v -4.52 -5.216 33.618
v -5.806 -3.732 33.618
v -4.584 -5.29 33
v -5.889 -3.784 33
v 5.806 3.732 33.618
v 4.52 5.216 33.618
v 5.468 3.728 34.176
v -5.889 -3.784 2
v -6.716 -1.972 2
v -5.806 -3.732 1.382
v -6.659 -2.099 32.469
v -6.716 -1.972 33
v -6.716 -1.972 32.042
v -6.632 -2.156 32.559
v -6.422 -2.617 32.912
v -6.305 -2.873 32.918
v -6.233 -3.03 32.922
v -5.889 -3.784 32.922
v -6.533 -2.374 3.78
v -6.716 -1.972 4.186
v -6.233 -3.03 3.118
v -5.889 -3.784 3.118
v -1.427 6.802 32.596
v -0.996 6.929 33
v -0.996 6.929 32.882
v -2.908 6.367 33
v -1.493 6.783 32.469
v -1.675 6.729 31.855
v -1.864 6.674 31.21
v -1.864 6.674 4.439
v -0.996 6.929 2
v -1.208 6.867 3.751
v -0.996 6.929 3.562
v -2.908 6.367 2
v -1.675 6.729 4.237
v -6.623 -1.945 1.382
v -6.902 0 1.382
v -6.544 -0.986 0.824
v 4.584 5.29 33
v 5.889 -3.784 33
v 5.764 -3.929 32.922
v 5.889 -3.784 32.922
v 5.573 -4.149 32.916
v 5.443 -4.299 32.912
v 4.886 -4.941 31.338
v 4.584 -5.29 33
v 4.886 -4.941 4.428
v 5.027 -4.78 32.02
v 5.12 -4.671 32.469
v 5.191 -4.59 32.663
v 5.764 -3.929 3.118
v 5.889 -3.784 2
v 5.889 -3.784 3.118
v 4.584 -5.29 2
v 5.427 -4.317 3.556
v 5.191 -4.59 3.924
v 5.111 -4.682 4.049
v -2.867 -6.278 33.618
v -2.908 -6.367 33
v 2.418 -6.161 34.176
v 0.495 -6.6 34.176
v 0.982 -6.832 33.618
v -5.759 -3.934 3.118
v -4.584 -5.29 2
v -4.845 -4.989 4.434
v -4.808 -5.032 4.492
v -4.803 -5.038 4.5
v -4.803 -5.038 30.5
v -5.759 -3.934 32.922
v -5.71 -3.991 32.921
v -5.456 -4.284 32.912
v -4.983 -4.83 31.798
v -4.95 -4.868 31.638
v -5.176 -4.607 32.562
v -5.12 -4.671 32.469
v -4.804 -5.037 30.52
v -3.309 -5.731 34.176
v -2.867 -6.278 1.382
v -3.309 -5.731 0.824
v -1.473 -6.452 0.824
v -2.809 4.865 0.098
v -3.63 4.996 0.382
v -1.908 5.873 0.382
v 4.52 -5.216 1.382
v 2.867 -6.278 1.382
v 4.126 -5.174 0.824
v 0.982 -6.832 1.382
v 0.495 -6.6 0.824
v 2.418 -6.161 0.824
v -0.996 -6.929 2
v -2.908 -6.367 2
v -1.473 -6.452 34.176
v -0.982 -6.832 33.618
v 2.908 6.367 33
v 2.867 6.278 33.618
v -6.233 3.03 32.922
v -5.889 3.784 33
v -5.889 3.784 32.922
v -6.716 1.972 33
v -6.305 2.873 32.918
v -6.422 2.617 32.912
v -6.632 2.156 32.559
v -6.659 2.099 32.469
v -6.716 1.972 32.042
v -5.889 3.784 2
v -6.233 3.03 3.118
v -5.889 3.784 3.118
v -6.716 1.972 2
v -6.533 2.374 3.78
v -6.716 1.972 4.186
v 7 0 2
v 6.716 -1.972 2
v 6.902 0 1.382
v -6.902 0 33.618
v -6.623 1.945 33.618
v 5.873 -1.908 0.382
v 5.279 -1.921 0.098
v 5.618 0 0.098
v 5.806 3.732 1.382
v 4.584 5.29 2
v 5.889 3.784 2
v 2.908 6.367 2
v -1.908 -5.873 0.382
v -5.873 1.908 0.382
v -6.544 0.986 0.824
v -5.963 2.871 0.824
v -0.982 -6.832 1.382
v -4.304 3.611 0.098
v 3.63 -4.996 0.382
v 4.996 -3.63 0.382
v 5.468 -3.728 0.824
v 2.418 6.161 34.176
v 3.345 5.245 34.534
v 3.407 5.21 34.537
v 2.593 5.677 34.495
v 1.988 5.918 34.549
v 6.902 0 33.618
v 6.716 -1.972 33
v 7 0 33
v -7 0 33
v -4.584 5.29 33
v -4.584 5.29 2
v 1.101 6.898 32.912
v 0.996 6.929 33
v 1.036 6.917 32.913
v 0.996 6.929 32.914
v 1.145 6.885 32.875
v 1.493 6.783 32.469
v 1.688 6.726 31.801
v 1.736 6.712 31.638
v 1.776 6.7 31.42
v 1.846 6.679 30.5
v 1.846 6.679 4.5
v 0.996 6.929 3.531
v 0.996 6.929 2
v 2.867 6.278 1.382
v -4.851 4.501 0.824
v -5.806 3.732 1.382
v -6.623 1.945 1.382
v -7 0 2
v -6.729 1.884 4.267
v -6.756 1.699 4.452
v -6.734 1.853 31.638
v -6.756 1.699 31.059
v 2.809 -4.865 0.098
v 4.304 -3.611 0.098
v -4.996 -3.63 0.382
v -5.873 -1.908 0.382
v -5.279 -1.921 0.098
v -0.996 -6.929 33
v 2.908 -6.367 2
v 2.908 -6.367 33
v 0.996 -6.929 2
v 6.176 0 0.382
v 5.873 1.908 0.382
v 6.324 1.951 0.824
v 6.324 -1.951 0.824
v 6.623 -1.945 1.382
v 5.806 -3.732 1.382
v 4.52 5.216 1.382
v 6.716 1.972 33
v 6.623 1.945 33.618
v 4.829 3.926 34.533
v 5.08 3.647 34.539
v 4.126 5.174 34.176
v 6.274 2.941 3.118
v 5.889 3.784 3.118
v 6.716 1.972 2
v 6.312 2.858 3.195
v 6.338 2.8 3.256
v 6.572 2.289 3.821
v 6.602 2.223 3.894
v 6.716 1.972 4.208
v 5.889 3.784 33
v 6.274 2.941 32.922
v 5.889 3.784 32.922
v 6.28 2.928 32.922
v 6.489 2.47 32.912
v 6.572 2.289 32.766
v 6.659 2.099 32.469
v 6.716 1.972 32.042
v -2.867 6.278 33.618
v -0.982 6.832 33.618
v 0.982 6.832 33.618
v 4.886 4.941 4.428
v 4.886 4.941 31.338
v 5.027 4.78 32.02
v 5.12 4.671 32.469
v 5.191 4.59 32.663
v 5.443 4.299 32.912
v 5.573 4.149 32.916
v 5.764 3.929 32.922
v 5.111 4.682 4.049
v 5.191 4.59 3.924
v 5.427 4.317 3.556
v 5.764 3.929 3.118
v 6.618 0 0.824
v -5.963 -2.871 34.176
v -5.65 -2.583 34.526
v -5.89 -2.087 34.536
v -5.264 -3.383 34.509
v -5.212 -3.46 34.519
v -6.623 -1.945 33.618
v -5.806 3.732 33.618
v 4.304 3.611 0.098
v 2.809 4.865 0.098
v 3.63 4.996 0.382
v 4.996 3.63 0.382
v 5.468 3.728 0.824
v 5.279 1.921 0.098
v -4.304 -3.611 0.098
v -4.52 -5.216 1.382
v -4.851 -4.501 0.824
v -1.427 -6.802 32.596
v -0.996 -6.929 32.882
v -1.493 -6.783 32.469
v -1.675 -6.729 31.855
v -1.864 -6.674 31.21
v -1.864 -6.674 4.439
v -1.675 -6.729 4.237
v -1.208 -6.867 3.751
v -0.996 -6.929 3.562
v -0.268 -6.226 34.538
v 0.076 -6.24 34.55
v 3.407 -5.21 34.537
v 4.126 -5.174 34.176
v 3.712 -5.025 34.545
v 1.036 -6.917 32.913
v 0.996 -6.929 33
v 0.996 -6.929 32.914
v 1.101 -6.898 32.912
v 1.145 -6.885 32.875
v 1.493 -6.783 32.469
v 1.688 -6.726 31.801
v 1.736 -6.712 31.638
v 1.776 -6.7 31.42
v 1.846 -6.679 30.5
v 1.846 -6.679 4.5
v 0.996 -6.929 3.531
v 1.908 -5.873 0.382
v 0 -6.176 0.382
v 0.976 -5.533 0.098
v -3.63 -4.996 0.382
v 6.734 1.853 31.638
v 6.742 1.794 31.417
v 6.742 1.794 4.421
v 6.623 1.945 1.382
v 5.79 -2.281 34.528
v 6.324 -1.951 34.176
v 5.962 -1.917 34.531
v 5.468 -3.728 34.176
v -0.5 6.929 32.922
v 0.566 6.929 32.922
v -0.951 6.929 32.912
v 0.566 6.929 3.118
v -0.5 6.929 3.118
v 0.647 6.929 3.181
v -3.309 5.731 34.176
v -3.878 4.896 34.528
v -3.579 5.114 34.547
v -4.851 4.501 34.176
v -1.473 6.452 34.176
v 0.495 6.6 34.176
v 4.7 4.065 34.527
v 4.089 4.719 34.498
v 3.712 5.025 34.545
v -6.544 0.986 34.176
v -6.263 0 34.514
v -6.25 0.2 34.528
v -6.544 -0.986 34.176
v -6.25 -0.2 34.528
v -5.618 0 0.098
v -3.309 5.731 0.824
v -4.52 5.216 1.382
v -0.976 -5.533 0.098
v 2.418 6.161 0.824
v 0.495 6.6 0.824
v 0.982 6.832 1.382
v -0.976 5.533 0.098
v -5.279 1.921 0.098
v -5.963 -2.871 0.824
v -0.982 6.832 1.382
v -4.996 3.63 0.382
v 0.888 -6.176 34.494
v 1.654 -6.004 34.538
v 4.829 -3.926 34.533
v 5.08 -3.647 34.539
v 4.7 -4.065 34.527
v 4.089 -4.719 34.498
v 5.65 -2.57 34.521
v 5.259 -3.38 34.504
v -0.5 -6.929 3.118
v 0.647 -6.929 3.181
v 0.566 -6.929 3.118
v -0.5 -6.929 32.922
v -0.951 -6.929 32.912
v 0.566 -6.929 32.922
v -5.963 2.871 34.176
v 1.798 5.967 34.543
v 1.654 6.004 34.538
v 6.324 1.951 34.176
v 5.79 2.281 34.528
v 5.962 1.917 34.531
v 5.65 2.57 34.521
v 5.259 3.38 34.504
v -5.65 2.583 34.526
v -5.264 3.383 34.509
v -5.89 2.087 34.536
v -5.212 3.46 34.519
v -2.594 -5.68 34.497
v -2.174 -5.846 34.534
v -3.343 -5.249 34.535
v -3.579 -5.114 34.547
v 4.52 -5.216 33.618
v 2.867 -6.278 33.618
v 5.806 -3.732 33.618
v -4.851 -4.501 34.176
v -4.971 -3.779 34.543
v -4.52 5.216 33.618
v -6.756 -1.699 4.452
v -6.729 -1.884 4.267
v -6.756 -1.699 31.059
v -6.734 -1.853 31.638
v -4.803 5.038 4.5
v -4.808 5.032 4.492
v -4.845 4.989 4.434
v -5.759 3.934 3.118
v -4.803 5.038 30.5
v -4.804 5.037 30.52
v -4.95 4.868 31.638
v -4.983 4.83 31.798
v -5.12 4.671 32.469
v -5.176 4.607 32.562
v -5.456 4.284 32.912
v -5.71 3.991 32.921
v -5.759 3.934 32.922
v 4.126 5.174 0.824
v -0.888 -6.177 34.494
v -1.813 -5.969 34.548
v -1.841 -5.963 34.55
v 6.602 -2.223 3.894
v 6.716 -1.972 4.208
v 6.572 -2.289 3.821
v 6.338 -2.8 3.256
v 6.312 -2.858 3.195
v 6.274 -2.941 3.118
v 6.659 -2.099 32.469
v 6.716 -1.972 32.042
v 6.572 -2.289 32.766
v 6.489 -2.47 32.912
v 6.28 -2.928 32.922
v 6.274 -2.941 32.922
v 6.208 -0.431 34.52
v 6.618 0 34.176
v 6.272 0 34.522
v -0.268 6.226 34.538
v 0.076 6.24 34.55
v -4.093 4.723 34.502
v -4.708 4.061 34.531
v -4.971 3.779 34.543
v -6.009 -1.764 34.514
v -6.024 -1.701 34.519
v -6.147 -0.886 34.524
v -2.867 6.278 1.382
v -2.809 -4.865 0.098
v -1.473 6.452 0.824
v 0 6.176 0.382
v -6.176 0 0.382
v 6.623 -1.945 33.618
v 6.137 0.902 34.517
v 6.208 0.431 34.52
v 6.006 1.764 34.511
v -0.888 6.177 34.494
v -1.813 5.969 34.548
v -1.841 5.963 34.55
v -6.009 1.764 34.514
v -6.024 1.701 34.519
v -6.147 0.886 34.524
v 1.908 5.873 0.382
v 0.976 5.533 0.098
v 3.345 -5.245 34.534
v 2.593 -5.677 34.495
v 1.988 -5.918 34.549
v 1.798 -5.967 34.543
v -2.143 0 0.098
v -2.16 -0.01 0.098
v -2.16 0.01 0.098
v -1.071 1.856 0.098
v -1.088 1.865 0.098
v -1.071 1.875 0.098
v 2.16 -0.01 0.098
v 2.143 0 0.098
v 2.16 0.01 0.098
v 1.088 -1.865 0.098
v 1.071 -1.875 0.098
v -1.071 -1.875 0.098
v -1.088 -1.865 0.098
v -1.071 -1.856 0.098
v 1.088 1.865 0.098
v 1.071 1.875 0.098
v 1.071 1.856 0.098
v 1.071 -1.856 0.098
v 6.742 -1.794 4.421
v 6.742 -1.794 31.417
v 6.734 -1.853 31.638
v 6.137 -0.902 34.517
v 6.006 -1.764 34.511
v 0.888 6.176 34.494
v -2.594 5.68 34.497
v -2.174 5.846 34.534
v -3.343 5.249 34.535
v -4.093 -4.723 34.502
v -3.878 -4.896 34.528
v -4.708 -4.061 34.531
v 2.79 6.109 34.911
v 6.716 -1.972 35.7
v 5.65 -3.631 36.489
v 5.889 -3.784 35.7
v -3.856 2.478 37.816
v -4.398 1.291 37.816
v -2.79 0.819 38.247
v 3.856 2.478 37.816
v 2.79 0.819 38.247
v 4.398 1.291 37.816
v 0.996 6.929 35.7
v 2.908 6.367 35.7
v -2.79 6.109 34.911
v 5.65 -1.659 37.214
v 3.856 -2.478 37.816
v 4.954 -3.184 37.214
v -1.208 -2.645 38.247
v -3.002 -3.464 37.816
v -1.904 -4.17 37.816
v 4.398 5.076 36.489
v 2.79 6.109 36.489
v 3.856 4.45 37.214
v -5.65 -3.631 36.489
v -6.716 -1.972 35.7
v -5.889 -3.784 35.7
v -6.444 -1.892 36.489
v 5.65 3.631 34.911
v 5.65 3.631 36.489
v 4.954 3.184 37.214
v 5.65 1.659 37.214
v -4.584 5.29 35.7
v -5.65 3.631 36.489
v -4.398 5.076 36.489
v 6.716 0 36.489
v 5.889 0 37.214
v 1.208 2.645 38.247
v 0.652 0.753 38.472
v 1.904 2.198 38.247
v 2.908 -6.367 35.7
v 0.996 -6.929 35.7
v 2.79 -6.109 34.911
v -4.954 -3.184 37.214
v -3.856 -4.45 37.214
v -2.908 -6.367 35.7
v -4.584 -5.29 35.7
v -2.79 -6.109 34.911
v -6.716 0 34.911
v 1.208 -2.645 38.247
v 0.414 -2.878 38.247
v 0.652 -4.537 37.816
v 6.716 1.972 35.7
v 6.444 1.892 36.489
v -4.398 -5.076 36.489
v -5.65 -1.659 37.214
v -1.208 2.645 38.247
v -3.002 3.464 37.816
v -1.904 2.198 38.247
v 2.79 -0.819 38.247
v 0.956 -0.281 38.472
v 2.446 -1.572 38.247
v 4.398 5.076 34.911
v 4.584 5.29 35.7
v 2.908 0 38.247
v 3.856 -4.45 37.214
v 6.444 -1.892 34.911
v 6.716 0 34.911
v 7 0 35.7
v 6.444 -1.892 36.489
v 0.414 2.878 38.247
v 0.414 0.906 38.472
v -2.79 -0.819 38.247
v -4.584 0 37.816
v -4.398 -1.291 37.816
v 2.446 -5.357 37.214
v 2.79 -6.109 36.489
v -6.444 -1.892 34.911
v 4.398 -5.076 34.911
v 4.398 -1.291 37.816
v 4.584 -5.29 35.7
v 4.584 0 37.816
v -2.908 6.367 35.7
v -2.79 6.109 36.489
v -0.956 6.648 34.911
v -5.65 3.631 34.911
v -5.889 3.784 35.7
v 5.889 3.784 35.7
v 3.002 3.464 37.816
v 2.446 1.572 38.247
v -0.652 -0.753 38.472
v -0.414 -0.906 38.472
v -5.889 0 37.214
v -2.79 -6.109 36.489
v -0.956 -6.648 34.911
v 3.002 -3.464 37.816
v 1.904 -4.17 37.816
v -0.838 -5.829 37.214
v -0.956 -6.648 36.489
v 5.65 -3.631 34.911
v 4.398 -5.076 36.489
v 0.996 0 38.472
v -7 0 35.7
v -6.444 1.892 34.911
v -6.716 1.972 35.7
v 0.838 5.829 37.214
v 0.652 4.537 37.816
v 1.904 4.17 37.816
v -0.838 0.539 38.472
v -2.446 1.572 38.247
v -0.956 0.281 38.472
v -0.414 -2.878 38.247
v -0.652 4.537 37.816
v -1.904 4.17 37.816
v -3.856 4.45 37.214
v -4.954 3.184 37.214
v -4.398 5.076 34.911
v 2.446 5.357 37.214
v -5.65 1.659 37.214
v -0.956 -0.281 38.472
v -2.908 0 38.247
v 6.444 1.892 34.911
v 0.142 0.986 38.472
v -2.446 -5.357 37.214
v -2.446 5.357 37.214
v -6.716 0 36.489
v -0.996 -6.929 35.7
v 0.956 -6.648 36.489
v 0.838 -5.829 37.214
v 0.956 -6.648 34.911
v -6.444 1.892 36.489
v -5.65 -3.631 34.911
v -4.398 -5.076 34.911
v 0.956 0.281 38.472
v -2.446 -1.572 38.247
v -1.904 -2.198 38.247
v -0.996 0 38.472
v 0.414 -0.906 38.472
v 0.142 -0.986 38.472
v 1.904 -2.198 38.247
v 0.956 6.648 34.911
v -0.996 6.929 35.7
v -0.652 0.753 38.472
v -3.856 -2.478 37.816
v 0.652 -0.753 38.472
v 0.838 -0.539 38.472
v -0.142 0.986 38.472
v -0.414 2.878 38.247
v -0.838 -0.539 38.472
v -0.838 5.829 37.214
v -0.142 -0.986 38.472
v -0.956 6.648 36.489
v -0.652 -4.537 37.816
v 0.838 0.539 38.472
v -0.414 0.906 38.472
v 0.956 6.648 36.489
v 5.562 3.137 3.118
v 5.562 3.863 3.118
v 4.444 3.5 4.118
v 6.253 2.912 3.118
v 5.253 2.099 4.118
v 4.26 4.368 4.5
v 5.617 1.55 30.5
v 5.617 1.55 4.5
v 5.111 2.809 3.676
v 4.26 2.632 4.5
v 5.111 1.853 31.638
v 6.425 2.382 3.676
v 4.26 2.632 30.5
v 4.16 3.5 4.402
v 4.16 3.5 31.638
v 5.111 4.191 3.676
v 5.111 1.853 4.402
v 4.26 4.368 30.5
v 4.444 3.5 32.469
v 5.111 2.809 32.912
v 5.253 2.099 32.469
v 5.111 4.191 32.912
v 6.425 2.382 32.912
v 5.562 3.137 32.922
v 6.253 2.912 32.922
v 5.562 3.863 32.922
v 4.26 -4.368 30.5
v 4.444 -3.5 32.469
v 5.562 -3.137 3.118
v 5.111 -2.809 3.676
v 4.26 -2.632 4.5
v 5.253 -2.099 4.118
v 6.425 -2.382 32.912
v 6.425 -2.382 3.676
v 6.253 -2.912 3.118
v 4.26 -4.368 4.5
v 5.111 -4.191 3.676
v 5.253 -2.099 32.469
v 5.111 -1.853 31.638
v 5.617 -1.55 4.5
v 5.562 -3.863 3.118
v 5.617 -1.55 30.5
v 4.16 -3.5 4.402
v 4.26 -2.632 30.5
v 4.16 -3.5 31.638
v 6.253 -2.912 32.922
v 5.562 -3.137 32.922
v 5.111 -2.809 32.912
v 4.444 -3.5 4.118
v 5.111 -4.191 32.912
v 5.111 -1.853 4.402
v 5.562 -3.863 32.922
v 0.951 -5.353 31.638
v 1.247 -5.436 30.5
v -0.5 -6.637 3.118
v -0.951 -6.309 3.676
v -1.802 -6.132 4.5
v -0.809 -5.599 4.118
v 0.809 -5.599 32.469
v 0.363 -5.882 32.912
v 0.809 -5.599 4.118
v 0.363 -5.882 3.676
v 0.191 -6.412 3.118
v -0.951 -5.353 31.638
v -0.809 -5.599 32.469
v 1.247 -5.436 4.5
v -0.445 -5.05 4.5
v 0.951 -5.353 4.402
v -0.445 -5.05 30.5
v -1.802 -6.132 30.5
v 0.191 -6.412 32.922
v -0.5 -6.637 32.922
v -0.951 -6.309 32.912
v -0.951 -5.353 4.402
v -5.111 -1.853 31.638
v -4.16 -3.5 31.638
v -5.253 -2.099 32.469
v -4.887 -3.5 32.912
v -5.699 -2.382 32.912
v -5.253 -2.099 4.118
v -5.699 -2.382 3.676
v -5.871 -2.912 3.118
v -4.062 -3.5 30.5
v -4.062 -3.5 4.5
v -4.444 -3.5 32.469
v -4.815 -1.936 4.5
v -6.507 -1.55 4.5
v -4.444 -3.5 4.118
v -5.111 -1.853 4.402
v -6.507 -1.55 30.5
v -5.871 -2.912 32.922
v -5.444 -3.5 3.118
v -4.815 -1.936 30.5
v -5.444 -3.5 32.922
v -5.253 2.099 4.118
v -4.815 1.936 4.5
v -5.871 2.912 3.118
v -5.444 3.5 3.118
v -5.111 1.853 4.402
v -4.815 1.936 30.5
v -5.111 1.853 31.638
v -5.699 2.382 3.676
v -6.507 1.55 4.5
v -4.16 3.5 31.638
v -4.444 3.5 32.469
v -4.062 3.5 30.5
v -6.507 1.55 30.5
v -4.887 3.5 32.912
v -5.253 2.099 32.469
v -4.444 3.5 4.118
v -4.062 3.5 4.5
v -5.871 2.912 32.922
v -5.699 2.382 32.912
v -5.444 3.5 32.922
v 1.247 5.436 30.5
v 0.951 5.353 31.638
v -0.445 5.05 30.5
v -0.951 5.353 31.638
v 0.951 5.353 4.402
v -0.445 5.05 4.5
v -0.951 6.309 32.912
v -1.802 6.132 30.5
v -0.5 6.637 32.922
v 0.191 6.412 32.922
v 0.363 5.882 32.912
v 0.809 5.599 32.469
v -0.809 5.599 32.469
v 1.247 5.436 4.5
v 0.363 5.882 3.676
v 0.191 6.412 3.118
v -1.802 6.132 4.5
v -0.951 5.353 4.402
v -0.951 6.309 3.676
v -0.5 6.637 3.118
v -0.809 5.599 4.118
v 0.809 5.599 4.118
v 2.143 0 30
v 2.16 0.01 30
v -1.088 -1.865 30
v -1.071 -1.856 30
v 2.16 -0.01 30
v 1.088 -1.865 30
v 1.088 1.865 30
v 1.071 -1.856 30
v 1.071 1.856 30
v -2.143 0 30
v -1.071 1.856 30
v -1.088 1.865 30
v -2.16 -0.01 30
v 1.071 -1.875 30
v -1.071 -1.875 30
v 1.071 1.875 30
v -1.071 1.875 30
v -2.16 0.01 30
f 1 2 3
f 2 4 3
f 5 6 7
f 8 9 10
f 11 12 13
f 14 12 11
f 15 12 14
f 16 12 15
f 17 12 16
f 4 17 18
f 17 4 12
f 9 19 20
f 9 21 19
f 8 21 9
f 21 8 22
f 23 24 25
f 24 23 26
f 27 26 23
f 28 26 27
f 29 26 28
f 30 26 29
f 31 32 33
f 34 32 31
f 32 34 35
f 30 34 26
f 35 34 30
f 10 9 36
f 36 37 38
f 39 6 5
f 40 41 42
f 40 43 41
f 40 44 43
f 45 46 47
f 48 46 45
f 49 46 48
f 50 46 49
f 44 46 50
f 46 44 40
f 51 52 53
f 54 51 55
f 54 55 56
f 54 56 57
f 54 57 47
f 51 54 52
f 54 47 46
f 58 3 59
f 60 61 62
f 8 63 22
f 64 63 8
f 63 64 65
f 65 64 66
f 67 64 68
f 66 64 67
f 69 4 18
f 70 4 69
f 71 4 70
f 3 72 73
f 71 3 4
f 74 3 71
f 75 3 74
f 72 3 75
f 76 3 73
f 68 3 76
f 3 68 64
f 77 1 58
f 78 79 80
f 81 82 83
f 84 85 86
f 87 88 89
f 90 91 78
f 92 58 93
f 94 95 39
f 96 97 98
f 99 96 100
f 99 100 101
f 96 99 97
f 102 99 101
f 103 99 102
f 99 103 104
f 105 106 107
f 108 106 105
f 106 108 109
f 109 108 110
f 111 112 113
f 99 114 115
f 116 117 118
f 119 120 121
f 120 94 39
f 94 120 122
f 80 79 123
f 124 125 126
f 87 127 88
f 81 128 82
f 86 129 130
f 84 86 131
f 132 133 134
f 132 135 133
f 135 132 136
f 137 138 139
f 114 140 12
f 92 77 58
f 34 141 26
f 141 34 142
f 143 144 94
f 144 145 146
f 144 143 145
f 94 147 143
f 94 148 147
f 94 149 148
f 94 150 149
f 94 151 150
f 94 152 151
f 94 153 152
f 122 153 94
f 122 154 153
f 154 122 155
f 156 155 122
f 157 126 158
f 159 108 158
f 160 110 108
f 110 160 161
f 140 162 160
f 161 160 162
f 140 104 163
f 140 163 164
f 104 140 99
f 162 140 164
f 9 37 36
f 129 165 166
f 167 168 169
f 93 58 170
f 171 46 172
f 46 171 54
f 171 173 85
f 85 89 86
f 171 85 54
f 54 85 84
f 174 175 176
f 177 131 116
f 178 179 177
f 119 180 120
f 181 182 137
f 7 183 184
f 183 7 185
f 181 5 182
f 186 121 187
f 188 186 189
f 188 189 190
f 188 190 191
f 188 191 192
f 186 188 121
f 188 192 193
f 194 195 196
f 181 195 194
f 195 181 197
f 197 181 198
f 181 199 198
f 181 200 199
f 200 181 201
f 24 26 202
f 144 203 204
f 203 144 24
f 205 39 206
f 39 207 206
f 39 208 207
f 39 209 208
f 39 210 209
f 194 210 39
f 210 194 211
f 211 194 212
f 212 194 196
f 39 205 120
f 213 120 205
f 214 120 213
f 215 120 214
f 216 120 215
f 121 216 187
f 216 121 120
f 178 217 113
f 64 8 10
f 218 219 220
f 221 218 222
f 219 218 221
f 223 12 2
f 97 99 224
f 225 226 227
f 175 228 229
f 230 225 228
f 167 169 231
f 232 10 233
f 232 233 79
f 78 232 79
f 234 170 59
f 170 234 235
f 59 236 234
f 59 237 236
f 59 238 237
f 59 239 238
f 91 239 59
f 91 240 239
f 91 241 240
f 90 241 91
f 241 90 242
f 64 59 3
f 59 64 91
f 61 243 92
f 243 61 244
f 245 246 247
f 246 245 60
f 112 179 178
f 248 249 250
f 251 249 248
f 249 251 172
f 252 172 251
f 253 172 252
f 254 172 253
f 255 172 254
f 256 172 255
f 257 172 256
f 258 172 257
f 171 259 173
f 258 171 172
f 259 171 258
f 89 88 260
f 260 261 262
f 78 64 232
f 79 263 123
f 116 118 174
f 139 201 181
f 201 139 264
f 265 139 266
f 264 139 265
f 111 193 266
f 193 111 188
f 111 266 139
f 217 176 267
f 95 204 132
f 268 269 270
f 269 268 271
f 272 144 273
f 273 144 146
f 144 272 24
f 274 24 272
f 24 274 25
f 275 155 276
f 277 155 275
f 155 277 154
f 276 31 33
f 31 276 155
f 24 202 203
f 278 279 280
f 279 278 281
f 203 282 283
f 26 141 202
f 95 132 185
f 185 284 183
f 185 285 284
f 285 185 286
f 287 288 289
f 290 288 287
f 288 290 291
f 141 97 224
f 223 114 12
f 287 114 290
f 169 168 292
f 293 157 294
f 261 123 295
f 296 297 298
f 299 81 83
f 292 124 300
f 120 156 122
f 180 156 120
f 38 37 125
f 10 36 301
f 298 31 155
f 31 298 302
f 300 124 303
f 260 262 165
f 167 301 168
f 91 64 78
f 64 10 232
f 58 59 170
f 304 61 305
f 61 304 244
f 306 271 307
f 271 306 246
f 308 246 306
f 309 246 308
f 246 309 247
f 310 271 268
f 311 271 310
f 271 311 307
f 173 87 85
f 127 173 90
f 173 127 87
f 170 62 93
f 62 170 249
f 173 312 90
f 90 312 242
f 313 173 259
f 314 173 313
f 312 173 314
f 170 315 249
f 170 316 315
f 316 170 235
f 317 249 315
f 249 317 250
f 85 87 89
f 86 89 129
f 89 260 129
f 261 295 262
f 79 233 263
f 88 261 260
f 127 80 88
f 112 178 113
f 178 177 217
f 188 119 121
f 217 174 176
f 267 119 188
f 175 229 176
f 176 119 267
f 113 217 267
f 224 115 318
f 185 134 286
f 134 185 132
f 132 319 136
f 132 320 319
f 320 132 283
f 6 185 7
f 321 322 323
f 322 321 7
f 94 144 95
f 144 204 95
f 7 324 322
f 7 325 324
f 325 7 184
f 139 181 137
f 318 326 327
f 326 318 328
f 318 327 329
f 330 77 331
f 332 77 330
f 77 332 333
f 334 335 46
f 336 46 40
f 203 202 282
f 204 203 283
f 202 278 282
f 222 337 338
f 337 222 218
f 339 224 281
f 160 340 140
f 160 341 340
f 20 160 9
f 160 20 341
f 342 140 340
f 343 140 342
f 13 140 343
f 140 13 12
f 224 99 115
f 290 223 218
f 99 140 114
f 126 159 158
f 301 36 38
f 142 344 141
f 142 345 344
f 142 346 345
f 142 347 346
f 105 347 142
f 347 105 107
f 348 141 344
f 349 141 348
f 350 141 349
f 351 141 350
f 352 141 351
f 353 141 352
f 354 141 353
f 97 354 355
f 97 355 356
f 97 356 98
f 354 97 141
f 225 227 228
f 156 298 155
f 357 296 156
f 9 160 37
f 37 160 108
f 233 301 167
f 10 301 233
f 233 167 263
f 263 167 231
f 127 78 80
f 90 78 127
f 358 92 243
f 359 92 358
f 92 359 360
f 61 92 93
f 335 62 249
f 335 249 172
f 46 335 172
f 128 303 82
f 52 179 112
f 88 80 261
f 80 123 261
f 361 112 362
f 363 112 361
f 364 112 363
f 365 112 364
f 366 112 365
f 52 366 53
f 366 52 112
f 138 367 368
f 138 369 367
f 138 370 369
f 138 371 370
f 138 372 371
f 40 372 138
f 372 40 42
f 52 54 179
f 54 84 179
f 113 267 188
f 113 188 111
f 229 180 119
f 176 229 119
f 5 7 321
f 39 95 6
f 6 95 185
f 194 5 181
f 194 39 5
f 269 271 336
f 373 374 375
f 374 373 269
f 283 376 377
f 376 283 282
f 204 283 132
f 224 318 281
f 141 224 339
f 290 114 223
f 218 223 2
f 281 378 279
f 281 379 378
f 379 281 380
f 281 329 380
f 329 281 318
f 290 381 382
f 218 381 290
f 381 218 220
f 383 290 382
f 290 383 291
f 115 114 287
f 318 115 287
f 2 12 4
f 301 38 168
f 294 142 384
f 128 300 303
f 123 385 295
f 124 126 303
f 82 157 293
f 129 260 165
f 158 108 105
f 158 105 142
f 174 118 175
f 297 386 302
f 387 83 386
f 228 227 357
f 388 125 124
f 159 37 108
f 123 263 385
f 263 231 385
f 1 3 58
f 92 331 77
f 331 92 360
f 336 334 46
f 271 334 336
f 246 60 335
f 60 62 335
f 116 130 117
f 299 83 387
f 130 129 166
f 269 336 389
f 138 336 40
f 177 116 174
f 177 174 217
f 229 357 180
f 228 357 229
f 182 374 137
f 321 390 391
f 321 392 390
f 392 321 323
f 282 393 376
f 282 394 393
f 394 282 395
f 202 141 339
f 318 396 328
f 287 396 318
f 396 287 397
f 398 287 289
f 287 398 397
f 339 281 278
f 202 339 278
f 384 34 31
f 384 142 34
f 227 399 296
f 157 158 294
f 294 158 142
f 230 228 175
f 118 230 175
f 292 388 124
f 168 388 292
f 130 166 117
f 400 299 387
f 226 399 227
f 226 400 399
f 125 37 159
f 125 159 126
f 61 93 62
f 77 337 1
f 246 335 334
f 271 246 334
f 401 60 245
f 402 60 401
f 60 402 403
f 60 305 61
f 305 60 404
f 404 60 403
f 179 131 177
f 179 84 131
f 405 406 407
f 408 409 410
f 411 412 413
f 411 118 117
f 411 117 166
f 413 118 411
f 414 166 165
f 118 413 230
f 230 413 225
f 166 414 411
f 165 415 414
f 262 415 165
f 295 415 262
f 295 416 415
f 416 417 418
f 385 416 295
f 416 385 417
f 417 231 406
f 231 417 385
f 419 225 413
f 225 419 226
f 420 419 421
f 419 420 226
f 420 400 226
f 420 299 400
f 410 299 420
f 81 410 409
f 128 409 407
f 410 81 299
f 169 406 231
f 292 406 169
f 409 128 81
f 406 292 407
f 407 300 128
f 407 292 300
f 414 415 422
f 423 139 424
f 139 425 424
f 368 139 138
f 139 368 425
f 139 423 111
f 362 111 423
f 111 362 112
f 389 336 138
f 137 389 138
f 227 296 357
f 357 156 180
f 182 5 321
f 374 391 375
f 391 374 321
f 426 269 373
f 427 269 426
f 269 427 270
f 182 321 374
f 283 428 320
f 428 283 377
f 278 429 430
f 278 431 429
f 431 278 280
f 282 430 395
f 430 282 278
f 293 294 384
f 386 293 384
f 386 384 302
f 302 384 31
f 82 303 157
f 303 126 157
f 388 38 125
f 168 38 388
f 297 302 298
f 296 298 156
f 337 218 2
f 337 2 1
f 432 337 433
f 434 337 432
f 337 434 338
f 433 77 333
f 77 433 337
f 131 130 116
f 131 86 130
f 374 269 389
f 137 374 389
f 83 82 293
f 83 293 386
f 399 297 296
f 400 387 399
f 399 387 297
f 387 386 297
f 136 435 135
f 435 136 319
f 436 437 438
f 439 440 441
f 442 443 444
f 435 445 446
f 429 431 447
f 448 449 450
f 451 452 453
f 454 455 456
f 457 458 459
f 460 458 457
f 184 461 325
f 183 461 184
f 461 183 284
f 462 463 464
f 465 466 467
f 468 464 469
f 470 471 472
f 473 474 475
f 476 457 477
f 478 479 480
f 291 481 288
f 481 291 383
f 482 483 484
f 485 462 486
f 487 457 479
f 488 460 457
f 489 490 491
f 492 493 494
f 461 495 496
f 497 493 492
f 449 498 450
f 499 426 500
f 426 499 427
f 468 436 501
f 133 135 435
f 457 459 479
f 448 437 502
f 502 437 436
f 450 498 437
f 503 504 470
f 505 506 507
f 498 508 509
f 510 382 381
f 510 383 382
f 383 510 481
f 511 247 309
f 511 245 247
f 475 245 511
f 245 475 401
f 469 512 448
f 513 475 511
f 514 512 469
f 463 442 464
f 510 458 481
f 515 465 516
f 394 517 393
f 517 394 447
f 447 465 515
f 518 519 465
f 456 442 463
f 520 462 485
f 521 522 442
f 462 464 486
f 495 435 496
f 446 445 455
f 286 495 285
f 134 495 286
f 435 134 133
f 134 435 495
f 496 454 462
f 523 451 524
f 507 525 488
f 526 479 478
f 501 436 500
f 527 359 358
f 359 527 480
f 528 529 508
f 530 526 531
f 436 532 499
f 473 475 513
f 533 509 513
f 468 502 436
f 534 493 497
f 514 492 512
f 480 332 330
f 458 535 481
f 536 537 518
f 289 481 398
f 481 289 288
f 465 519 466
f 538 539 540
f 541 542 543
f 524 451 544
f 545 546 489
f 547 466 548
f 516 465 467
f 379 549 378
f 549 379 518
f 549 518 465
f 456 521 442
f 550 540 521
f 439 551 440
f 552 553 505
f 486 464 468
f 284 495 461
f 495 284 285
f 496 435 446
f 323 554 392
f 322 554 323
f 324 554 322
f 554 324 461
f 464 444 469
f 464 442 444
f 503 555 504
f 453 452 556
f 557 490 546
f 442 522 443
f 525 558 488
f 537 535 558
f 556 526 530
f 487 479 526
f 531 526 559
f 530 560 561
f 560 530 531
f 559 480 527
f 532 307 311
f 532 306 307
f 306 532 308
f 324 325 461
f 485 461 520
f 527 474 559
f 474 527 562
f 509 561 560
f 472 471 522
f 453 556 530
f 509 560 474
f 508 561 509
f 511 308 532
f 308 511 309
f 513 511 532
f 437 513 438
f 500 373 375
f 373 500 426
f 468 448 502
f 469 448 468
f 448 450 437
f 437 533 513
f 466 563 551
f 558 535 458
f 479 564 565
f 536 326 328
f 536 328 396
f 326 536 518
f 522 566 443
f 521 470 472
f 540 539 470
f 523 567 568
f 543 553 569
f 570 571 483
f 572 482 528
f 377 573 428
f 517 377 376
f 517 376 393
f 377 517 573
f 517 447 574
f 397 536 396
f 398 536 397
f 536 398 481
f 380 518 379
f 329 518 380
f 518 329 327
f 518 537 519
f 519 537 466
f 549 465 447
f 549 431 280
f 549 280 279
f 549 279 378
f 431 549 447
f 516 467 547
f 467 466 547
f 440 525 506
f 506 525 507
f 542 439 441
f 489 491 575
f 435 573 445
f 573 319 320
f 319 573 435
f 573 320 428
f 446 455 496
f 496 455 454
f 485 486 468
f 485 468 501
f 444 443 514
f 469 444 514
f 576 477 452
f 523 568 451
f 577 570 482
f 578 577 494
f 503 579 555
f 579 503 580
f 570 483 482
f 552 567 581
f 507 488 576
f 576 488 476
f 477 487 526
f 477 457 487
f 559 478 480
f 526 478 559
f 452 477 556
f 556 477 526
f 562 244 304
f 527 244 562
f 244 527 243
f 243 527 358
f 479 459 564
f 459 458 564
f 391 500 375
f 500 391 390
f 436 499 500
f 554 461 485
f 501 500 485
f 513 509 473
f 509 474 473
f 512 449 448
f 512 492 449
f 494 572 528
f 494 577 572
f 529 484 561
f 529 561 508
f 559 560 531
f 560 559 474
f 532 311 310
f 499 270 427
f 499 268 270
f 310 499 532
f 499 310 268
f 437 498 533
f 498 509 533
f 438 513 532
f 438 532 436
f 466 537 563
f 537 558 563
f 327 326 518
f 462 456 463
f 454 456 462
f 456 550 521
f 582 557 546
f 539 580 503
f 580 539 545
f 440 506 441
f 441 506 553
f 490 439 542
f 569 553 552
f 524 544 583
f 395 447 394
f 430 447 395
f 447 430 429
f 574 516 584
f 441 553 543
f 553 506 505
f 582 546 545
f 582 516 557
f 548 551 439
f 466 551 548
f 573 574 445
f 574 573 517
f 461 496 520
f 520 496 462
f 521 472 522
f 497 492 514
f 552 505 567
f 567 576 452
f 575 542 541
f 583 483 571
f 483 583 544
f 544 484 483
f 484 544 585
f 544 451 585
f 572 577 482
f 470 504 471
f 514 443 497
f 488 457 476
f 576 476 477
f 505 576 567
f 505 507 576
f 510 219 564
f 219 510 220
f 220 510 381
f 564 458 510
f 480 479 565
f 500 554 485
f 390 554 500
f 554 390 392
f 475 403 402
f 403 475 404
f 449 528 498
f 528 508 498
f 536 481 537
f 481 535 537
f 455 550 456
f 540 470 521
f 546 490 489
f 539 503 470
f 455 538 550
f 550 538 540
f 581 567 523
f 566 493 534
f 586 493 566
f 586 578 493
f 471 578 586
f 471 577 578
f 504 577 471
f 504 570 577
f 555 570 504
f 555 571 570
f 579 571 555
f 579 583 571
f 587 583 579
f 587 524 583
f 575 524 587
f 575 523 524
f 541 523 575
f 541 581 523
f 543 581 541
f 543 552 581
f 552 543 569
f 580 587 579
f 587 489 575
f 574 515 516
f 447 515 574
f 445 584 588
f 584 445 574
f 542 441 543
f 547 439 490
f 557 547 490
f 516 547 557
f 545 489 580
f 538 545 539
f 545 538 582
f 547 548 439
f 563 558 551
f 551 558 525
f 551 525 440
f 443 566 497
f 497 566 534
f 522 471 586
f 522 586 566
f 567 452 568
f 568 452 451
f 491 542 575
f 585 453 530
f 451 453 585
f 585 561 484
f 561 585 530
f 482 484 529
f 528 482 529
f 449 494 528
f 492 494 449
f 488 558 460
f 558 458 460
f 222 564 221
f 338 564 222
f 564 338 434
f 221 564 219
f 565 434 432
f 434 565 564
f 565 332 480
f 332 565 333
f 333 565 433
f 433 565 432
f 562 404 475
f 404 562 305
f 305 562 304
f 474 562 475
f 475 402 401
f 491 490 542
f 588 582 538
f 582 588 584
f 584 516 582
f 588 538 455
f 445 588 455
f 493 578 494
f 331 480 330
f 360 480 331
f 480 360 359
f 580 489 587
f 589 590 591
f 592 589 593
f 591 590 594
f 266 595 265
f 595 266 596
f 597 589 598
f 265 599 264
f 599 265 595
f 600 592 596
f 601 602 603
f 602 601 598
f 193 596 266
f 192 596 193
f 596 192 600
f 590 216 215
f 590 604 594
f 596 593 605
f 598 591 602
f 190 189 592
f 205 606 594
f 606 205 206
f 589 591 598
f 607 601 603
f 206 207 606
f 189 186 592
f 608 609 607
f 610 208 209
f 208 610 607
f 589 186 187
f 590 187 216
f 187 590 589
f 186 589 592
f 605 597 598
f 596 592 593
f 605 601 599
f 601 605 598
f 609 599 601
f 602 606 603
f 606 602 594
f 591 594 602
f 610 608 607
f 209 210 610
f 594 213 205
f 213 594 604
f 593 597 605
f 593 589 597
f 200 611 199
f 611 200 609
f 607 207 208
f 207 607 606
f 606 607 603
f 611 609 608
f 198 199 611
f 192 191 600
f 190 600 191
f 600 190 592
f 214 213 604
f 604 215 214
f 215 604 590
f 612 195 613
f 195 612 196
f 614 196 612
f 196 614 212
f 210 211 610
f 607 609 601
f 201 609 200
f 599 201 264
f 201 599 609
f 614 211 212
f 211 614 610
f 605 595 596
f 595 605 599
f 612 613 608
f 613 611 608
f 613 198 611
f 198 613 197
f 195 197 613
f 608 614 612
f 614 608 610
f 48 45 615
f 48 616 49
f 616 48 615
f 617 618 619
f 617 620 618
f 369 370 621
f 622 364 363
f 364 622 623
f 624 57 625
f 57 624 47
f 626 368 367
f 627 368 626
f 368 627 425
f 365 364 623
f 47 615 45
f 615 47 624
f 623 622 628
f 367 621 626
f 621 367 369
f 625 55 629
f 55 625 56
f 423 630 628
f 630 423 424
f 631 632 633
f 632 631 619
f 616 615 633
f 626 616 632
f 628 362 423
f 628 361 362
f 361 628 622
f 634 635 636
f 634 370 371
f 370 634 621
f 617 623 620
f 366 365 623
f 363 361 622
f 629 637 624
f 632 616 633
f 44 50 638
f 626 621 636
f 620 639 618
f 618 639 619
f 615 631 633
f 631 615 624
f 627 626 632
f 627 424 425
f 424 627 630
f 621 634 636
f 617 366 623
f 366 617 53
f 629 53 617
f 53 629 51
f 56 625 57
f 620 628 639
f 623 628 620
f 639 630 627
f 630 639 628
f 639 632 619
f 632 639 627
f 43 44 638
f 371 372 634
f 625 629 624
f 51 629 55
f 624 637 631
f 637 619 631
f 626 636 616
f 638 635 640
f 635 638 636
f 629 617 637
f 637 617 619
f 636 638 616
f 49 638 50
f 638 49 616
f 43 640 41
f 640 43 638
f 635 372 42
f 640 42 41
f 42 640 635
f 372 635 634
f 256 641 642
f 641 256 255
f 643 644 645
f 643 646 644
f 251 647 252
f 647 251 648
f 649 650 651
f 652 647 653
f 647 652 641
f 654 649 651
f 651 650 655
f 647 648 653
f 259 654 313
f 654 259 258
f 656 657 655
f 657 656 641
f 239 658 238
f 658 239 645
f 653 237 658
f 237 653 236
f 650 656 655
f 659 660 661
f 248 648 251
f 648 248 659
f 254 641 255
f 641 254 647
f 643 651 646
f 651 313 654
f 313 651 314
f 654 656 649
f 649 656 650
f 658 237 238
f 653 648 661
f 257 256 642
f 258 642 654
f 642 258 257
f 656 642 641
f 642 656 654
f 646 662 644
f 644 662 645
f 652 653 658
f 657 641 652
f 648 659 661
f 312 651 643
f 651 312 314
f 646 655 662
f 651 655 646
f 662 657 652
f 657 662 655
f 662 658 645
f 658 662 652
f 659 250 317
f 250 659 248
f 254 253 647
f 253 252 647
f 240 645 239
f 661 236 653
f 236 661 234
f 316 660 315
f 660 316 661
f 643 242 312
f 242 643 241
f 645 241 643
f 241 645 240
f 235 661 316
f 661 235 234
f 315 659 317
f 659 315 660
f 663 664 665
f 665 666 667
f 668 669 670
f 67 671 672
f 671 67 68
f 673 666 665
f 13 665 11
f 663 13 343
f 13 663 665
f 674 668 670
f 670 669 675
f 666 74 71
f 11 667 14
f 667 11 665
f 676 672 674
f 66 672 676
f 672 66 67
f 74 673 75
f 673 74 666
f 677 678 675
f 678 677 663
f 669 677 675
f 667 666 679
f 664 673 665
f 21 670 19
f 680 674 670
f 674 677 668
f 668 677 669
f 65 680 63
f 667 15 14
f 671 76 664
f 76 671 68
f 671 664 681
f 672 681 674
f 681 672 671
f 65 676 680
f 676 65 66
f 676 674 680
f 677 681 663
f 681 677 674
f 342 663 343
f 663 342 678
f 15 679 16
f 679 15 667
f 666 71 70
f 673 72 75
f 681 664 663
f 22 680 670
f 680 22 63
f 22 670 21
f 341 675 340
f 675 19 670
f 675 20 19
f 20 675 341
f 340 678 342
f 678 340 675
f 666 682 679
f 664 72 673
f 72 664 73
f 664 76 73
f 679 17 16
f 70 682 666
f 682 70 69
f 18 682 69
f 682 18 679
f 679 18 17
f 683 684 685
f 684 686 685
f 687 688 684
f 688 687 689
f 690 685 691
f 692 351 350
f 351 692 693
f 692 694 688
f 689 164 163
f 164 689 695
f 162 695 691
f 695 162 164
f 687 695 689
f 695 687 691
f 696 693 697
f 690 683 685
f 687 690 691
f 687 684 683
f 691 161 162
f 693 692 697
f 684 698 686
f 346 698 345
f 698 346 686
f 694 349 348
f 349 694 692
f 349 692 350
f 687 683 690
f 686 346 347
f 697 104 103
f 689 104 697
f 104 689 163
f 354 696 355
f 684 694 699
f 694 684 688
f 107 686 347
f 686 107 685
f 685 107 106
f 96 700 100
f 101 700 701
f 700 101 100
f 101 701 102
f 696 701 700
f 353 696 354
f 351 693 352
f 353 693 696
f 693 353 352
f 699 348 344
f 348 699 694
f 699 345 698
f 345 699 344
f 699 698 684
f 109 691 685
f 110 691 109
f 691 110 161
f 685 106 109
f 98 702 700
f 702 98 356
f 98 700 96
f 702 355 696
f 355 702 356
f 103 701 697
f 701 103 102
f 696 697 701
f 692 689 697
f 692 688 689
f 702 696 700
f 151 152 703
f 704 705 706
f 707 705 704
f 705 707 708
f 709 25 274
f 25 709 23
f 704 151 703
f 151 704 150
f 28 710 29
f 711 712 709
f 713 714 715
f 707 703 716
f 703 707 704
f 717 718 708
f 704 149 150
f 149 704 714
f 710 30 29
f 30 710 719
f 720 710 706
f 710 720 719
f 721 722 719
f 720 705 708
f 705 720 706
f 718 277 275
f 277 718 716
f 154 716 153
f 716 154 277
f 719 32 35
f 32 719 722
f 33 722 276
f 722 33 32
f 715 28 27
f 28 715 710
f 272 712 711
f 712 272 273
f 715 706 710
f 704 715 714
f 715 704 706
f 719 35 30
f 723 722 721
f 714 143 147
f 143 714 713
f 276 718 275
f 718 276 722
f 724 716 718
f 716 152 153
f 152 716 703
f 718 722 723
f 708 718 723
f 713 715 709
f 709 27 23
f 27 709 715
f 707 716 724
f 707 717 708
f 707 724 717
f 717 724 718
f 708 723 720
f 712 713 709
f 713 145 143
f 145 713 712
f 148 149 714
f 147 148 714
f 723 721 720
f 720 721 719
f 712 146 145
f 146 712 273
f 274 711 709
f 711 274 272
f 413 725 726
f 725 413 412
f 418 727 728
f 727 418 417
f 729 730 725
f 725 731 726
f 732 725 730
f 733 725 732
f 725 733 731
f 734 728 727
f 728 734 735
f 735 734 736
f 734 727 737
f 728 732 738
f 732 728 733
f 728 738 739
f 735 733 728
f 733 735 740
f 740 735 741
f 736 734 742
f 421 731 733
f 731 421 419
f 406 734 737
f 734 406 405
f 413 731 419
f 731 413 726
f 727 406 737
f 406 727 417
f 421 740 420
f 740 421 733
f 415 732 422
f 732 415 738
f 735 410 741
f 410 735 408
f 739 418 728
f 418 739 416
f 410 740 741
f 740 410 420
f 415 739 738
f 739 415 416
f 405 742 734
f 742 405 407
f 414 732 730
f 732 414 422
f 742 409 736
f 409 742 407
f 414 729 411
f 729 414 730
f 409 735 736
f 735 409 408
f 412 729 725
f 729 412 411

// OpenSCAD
// [FL_INDEX: keywords="openscad, 3d_parametric, Fully_Parametric_Screwdriver, csg_solid" | COT="Parametric OpenSCAD design from 3DCodeverse"]
// Title: Fully Parametric Screwdriver

bitSize=7.5; // this is the maximum diameter of the bit in mm
bitLength=30;//defines the amount the bit will be embedded in the driver
driverRadius=7; //radius of the driver
driverHeight=35; //height of the driver (currently is the height of the body, i am too lazy to fix it to be the overall height of the driver... sorry
numOfGrips=6;// number of cut outs for your fingers to grab
gripRadius=2;// defines the radius of the figer holds
gripHeight=30;//defines the length of the finger holds
bevelRadius=2;// this defines the curve at the bottom
SmoothingAmount=5;// this is the smoothing factor on the rounded caps 

module driverBase(){
	hull(){
		for(i=[1:SmoothingAmount])
		{
  			translate([0,0,+bevelRadius-bevelRadius*cos(i*90/SmoothingAmount)])cylinder(r=(driverRadius-bevelRadius+bevelRadius*sin(i*90/SmoothingAmount)),h=(driverHeight-2*bevelRadius+2*bevelRadius*cos(i*90/SmoothingAmount)));
		}
	}
}

module grips(){
	for(i=[1:numOfGrips])
	{
	hull(){
		for(n=[1:SmoothingAmount])
			translate([driverRadius*sin(i*360/numOfGrips),driverRadius*cos(i*360/numOfGrips),(driverHeight-gripHeight)/2+gripRadius*sin(n*90/SmoothingAmount)]) cylinder(r=gripRadius*sin(n*90/SmoothingAmount),h=gripHeight-2*gripRadius+2*gripRadius*cos(n*90/SmoothingAmount));
		}
	}
}
module hexagon(size, height) {
  boxWidth = size/1.75;
  for (r = [-60, 0, 60]) rotate([0,0,r]) cube([boxWidth, size, height], true);
}
module head(){
translate([0,0,driverHeight+.1*driverRadius]) scale([1,1,.4]) sphere(driverRadius);
}
difference(){
union(){
driverBase();
head();
}
grips();
translate(0,0,bitLength)hexagon(bitSize/2,bitLength*2);
}
